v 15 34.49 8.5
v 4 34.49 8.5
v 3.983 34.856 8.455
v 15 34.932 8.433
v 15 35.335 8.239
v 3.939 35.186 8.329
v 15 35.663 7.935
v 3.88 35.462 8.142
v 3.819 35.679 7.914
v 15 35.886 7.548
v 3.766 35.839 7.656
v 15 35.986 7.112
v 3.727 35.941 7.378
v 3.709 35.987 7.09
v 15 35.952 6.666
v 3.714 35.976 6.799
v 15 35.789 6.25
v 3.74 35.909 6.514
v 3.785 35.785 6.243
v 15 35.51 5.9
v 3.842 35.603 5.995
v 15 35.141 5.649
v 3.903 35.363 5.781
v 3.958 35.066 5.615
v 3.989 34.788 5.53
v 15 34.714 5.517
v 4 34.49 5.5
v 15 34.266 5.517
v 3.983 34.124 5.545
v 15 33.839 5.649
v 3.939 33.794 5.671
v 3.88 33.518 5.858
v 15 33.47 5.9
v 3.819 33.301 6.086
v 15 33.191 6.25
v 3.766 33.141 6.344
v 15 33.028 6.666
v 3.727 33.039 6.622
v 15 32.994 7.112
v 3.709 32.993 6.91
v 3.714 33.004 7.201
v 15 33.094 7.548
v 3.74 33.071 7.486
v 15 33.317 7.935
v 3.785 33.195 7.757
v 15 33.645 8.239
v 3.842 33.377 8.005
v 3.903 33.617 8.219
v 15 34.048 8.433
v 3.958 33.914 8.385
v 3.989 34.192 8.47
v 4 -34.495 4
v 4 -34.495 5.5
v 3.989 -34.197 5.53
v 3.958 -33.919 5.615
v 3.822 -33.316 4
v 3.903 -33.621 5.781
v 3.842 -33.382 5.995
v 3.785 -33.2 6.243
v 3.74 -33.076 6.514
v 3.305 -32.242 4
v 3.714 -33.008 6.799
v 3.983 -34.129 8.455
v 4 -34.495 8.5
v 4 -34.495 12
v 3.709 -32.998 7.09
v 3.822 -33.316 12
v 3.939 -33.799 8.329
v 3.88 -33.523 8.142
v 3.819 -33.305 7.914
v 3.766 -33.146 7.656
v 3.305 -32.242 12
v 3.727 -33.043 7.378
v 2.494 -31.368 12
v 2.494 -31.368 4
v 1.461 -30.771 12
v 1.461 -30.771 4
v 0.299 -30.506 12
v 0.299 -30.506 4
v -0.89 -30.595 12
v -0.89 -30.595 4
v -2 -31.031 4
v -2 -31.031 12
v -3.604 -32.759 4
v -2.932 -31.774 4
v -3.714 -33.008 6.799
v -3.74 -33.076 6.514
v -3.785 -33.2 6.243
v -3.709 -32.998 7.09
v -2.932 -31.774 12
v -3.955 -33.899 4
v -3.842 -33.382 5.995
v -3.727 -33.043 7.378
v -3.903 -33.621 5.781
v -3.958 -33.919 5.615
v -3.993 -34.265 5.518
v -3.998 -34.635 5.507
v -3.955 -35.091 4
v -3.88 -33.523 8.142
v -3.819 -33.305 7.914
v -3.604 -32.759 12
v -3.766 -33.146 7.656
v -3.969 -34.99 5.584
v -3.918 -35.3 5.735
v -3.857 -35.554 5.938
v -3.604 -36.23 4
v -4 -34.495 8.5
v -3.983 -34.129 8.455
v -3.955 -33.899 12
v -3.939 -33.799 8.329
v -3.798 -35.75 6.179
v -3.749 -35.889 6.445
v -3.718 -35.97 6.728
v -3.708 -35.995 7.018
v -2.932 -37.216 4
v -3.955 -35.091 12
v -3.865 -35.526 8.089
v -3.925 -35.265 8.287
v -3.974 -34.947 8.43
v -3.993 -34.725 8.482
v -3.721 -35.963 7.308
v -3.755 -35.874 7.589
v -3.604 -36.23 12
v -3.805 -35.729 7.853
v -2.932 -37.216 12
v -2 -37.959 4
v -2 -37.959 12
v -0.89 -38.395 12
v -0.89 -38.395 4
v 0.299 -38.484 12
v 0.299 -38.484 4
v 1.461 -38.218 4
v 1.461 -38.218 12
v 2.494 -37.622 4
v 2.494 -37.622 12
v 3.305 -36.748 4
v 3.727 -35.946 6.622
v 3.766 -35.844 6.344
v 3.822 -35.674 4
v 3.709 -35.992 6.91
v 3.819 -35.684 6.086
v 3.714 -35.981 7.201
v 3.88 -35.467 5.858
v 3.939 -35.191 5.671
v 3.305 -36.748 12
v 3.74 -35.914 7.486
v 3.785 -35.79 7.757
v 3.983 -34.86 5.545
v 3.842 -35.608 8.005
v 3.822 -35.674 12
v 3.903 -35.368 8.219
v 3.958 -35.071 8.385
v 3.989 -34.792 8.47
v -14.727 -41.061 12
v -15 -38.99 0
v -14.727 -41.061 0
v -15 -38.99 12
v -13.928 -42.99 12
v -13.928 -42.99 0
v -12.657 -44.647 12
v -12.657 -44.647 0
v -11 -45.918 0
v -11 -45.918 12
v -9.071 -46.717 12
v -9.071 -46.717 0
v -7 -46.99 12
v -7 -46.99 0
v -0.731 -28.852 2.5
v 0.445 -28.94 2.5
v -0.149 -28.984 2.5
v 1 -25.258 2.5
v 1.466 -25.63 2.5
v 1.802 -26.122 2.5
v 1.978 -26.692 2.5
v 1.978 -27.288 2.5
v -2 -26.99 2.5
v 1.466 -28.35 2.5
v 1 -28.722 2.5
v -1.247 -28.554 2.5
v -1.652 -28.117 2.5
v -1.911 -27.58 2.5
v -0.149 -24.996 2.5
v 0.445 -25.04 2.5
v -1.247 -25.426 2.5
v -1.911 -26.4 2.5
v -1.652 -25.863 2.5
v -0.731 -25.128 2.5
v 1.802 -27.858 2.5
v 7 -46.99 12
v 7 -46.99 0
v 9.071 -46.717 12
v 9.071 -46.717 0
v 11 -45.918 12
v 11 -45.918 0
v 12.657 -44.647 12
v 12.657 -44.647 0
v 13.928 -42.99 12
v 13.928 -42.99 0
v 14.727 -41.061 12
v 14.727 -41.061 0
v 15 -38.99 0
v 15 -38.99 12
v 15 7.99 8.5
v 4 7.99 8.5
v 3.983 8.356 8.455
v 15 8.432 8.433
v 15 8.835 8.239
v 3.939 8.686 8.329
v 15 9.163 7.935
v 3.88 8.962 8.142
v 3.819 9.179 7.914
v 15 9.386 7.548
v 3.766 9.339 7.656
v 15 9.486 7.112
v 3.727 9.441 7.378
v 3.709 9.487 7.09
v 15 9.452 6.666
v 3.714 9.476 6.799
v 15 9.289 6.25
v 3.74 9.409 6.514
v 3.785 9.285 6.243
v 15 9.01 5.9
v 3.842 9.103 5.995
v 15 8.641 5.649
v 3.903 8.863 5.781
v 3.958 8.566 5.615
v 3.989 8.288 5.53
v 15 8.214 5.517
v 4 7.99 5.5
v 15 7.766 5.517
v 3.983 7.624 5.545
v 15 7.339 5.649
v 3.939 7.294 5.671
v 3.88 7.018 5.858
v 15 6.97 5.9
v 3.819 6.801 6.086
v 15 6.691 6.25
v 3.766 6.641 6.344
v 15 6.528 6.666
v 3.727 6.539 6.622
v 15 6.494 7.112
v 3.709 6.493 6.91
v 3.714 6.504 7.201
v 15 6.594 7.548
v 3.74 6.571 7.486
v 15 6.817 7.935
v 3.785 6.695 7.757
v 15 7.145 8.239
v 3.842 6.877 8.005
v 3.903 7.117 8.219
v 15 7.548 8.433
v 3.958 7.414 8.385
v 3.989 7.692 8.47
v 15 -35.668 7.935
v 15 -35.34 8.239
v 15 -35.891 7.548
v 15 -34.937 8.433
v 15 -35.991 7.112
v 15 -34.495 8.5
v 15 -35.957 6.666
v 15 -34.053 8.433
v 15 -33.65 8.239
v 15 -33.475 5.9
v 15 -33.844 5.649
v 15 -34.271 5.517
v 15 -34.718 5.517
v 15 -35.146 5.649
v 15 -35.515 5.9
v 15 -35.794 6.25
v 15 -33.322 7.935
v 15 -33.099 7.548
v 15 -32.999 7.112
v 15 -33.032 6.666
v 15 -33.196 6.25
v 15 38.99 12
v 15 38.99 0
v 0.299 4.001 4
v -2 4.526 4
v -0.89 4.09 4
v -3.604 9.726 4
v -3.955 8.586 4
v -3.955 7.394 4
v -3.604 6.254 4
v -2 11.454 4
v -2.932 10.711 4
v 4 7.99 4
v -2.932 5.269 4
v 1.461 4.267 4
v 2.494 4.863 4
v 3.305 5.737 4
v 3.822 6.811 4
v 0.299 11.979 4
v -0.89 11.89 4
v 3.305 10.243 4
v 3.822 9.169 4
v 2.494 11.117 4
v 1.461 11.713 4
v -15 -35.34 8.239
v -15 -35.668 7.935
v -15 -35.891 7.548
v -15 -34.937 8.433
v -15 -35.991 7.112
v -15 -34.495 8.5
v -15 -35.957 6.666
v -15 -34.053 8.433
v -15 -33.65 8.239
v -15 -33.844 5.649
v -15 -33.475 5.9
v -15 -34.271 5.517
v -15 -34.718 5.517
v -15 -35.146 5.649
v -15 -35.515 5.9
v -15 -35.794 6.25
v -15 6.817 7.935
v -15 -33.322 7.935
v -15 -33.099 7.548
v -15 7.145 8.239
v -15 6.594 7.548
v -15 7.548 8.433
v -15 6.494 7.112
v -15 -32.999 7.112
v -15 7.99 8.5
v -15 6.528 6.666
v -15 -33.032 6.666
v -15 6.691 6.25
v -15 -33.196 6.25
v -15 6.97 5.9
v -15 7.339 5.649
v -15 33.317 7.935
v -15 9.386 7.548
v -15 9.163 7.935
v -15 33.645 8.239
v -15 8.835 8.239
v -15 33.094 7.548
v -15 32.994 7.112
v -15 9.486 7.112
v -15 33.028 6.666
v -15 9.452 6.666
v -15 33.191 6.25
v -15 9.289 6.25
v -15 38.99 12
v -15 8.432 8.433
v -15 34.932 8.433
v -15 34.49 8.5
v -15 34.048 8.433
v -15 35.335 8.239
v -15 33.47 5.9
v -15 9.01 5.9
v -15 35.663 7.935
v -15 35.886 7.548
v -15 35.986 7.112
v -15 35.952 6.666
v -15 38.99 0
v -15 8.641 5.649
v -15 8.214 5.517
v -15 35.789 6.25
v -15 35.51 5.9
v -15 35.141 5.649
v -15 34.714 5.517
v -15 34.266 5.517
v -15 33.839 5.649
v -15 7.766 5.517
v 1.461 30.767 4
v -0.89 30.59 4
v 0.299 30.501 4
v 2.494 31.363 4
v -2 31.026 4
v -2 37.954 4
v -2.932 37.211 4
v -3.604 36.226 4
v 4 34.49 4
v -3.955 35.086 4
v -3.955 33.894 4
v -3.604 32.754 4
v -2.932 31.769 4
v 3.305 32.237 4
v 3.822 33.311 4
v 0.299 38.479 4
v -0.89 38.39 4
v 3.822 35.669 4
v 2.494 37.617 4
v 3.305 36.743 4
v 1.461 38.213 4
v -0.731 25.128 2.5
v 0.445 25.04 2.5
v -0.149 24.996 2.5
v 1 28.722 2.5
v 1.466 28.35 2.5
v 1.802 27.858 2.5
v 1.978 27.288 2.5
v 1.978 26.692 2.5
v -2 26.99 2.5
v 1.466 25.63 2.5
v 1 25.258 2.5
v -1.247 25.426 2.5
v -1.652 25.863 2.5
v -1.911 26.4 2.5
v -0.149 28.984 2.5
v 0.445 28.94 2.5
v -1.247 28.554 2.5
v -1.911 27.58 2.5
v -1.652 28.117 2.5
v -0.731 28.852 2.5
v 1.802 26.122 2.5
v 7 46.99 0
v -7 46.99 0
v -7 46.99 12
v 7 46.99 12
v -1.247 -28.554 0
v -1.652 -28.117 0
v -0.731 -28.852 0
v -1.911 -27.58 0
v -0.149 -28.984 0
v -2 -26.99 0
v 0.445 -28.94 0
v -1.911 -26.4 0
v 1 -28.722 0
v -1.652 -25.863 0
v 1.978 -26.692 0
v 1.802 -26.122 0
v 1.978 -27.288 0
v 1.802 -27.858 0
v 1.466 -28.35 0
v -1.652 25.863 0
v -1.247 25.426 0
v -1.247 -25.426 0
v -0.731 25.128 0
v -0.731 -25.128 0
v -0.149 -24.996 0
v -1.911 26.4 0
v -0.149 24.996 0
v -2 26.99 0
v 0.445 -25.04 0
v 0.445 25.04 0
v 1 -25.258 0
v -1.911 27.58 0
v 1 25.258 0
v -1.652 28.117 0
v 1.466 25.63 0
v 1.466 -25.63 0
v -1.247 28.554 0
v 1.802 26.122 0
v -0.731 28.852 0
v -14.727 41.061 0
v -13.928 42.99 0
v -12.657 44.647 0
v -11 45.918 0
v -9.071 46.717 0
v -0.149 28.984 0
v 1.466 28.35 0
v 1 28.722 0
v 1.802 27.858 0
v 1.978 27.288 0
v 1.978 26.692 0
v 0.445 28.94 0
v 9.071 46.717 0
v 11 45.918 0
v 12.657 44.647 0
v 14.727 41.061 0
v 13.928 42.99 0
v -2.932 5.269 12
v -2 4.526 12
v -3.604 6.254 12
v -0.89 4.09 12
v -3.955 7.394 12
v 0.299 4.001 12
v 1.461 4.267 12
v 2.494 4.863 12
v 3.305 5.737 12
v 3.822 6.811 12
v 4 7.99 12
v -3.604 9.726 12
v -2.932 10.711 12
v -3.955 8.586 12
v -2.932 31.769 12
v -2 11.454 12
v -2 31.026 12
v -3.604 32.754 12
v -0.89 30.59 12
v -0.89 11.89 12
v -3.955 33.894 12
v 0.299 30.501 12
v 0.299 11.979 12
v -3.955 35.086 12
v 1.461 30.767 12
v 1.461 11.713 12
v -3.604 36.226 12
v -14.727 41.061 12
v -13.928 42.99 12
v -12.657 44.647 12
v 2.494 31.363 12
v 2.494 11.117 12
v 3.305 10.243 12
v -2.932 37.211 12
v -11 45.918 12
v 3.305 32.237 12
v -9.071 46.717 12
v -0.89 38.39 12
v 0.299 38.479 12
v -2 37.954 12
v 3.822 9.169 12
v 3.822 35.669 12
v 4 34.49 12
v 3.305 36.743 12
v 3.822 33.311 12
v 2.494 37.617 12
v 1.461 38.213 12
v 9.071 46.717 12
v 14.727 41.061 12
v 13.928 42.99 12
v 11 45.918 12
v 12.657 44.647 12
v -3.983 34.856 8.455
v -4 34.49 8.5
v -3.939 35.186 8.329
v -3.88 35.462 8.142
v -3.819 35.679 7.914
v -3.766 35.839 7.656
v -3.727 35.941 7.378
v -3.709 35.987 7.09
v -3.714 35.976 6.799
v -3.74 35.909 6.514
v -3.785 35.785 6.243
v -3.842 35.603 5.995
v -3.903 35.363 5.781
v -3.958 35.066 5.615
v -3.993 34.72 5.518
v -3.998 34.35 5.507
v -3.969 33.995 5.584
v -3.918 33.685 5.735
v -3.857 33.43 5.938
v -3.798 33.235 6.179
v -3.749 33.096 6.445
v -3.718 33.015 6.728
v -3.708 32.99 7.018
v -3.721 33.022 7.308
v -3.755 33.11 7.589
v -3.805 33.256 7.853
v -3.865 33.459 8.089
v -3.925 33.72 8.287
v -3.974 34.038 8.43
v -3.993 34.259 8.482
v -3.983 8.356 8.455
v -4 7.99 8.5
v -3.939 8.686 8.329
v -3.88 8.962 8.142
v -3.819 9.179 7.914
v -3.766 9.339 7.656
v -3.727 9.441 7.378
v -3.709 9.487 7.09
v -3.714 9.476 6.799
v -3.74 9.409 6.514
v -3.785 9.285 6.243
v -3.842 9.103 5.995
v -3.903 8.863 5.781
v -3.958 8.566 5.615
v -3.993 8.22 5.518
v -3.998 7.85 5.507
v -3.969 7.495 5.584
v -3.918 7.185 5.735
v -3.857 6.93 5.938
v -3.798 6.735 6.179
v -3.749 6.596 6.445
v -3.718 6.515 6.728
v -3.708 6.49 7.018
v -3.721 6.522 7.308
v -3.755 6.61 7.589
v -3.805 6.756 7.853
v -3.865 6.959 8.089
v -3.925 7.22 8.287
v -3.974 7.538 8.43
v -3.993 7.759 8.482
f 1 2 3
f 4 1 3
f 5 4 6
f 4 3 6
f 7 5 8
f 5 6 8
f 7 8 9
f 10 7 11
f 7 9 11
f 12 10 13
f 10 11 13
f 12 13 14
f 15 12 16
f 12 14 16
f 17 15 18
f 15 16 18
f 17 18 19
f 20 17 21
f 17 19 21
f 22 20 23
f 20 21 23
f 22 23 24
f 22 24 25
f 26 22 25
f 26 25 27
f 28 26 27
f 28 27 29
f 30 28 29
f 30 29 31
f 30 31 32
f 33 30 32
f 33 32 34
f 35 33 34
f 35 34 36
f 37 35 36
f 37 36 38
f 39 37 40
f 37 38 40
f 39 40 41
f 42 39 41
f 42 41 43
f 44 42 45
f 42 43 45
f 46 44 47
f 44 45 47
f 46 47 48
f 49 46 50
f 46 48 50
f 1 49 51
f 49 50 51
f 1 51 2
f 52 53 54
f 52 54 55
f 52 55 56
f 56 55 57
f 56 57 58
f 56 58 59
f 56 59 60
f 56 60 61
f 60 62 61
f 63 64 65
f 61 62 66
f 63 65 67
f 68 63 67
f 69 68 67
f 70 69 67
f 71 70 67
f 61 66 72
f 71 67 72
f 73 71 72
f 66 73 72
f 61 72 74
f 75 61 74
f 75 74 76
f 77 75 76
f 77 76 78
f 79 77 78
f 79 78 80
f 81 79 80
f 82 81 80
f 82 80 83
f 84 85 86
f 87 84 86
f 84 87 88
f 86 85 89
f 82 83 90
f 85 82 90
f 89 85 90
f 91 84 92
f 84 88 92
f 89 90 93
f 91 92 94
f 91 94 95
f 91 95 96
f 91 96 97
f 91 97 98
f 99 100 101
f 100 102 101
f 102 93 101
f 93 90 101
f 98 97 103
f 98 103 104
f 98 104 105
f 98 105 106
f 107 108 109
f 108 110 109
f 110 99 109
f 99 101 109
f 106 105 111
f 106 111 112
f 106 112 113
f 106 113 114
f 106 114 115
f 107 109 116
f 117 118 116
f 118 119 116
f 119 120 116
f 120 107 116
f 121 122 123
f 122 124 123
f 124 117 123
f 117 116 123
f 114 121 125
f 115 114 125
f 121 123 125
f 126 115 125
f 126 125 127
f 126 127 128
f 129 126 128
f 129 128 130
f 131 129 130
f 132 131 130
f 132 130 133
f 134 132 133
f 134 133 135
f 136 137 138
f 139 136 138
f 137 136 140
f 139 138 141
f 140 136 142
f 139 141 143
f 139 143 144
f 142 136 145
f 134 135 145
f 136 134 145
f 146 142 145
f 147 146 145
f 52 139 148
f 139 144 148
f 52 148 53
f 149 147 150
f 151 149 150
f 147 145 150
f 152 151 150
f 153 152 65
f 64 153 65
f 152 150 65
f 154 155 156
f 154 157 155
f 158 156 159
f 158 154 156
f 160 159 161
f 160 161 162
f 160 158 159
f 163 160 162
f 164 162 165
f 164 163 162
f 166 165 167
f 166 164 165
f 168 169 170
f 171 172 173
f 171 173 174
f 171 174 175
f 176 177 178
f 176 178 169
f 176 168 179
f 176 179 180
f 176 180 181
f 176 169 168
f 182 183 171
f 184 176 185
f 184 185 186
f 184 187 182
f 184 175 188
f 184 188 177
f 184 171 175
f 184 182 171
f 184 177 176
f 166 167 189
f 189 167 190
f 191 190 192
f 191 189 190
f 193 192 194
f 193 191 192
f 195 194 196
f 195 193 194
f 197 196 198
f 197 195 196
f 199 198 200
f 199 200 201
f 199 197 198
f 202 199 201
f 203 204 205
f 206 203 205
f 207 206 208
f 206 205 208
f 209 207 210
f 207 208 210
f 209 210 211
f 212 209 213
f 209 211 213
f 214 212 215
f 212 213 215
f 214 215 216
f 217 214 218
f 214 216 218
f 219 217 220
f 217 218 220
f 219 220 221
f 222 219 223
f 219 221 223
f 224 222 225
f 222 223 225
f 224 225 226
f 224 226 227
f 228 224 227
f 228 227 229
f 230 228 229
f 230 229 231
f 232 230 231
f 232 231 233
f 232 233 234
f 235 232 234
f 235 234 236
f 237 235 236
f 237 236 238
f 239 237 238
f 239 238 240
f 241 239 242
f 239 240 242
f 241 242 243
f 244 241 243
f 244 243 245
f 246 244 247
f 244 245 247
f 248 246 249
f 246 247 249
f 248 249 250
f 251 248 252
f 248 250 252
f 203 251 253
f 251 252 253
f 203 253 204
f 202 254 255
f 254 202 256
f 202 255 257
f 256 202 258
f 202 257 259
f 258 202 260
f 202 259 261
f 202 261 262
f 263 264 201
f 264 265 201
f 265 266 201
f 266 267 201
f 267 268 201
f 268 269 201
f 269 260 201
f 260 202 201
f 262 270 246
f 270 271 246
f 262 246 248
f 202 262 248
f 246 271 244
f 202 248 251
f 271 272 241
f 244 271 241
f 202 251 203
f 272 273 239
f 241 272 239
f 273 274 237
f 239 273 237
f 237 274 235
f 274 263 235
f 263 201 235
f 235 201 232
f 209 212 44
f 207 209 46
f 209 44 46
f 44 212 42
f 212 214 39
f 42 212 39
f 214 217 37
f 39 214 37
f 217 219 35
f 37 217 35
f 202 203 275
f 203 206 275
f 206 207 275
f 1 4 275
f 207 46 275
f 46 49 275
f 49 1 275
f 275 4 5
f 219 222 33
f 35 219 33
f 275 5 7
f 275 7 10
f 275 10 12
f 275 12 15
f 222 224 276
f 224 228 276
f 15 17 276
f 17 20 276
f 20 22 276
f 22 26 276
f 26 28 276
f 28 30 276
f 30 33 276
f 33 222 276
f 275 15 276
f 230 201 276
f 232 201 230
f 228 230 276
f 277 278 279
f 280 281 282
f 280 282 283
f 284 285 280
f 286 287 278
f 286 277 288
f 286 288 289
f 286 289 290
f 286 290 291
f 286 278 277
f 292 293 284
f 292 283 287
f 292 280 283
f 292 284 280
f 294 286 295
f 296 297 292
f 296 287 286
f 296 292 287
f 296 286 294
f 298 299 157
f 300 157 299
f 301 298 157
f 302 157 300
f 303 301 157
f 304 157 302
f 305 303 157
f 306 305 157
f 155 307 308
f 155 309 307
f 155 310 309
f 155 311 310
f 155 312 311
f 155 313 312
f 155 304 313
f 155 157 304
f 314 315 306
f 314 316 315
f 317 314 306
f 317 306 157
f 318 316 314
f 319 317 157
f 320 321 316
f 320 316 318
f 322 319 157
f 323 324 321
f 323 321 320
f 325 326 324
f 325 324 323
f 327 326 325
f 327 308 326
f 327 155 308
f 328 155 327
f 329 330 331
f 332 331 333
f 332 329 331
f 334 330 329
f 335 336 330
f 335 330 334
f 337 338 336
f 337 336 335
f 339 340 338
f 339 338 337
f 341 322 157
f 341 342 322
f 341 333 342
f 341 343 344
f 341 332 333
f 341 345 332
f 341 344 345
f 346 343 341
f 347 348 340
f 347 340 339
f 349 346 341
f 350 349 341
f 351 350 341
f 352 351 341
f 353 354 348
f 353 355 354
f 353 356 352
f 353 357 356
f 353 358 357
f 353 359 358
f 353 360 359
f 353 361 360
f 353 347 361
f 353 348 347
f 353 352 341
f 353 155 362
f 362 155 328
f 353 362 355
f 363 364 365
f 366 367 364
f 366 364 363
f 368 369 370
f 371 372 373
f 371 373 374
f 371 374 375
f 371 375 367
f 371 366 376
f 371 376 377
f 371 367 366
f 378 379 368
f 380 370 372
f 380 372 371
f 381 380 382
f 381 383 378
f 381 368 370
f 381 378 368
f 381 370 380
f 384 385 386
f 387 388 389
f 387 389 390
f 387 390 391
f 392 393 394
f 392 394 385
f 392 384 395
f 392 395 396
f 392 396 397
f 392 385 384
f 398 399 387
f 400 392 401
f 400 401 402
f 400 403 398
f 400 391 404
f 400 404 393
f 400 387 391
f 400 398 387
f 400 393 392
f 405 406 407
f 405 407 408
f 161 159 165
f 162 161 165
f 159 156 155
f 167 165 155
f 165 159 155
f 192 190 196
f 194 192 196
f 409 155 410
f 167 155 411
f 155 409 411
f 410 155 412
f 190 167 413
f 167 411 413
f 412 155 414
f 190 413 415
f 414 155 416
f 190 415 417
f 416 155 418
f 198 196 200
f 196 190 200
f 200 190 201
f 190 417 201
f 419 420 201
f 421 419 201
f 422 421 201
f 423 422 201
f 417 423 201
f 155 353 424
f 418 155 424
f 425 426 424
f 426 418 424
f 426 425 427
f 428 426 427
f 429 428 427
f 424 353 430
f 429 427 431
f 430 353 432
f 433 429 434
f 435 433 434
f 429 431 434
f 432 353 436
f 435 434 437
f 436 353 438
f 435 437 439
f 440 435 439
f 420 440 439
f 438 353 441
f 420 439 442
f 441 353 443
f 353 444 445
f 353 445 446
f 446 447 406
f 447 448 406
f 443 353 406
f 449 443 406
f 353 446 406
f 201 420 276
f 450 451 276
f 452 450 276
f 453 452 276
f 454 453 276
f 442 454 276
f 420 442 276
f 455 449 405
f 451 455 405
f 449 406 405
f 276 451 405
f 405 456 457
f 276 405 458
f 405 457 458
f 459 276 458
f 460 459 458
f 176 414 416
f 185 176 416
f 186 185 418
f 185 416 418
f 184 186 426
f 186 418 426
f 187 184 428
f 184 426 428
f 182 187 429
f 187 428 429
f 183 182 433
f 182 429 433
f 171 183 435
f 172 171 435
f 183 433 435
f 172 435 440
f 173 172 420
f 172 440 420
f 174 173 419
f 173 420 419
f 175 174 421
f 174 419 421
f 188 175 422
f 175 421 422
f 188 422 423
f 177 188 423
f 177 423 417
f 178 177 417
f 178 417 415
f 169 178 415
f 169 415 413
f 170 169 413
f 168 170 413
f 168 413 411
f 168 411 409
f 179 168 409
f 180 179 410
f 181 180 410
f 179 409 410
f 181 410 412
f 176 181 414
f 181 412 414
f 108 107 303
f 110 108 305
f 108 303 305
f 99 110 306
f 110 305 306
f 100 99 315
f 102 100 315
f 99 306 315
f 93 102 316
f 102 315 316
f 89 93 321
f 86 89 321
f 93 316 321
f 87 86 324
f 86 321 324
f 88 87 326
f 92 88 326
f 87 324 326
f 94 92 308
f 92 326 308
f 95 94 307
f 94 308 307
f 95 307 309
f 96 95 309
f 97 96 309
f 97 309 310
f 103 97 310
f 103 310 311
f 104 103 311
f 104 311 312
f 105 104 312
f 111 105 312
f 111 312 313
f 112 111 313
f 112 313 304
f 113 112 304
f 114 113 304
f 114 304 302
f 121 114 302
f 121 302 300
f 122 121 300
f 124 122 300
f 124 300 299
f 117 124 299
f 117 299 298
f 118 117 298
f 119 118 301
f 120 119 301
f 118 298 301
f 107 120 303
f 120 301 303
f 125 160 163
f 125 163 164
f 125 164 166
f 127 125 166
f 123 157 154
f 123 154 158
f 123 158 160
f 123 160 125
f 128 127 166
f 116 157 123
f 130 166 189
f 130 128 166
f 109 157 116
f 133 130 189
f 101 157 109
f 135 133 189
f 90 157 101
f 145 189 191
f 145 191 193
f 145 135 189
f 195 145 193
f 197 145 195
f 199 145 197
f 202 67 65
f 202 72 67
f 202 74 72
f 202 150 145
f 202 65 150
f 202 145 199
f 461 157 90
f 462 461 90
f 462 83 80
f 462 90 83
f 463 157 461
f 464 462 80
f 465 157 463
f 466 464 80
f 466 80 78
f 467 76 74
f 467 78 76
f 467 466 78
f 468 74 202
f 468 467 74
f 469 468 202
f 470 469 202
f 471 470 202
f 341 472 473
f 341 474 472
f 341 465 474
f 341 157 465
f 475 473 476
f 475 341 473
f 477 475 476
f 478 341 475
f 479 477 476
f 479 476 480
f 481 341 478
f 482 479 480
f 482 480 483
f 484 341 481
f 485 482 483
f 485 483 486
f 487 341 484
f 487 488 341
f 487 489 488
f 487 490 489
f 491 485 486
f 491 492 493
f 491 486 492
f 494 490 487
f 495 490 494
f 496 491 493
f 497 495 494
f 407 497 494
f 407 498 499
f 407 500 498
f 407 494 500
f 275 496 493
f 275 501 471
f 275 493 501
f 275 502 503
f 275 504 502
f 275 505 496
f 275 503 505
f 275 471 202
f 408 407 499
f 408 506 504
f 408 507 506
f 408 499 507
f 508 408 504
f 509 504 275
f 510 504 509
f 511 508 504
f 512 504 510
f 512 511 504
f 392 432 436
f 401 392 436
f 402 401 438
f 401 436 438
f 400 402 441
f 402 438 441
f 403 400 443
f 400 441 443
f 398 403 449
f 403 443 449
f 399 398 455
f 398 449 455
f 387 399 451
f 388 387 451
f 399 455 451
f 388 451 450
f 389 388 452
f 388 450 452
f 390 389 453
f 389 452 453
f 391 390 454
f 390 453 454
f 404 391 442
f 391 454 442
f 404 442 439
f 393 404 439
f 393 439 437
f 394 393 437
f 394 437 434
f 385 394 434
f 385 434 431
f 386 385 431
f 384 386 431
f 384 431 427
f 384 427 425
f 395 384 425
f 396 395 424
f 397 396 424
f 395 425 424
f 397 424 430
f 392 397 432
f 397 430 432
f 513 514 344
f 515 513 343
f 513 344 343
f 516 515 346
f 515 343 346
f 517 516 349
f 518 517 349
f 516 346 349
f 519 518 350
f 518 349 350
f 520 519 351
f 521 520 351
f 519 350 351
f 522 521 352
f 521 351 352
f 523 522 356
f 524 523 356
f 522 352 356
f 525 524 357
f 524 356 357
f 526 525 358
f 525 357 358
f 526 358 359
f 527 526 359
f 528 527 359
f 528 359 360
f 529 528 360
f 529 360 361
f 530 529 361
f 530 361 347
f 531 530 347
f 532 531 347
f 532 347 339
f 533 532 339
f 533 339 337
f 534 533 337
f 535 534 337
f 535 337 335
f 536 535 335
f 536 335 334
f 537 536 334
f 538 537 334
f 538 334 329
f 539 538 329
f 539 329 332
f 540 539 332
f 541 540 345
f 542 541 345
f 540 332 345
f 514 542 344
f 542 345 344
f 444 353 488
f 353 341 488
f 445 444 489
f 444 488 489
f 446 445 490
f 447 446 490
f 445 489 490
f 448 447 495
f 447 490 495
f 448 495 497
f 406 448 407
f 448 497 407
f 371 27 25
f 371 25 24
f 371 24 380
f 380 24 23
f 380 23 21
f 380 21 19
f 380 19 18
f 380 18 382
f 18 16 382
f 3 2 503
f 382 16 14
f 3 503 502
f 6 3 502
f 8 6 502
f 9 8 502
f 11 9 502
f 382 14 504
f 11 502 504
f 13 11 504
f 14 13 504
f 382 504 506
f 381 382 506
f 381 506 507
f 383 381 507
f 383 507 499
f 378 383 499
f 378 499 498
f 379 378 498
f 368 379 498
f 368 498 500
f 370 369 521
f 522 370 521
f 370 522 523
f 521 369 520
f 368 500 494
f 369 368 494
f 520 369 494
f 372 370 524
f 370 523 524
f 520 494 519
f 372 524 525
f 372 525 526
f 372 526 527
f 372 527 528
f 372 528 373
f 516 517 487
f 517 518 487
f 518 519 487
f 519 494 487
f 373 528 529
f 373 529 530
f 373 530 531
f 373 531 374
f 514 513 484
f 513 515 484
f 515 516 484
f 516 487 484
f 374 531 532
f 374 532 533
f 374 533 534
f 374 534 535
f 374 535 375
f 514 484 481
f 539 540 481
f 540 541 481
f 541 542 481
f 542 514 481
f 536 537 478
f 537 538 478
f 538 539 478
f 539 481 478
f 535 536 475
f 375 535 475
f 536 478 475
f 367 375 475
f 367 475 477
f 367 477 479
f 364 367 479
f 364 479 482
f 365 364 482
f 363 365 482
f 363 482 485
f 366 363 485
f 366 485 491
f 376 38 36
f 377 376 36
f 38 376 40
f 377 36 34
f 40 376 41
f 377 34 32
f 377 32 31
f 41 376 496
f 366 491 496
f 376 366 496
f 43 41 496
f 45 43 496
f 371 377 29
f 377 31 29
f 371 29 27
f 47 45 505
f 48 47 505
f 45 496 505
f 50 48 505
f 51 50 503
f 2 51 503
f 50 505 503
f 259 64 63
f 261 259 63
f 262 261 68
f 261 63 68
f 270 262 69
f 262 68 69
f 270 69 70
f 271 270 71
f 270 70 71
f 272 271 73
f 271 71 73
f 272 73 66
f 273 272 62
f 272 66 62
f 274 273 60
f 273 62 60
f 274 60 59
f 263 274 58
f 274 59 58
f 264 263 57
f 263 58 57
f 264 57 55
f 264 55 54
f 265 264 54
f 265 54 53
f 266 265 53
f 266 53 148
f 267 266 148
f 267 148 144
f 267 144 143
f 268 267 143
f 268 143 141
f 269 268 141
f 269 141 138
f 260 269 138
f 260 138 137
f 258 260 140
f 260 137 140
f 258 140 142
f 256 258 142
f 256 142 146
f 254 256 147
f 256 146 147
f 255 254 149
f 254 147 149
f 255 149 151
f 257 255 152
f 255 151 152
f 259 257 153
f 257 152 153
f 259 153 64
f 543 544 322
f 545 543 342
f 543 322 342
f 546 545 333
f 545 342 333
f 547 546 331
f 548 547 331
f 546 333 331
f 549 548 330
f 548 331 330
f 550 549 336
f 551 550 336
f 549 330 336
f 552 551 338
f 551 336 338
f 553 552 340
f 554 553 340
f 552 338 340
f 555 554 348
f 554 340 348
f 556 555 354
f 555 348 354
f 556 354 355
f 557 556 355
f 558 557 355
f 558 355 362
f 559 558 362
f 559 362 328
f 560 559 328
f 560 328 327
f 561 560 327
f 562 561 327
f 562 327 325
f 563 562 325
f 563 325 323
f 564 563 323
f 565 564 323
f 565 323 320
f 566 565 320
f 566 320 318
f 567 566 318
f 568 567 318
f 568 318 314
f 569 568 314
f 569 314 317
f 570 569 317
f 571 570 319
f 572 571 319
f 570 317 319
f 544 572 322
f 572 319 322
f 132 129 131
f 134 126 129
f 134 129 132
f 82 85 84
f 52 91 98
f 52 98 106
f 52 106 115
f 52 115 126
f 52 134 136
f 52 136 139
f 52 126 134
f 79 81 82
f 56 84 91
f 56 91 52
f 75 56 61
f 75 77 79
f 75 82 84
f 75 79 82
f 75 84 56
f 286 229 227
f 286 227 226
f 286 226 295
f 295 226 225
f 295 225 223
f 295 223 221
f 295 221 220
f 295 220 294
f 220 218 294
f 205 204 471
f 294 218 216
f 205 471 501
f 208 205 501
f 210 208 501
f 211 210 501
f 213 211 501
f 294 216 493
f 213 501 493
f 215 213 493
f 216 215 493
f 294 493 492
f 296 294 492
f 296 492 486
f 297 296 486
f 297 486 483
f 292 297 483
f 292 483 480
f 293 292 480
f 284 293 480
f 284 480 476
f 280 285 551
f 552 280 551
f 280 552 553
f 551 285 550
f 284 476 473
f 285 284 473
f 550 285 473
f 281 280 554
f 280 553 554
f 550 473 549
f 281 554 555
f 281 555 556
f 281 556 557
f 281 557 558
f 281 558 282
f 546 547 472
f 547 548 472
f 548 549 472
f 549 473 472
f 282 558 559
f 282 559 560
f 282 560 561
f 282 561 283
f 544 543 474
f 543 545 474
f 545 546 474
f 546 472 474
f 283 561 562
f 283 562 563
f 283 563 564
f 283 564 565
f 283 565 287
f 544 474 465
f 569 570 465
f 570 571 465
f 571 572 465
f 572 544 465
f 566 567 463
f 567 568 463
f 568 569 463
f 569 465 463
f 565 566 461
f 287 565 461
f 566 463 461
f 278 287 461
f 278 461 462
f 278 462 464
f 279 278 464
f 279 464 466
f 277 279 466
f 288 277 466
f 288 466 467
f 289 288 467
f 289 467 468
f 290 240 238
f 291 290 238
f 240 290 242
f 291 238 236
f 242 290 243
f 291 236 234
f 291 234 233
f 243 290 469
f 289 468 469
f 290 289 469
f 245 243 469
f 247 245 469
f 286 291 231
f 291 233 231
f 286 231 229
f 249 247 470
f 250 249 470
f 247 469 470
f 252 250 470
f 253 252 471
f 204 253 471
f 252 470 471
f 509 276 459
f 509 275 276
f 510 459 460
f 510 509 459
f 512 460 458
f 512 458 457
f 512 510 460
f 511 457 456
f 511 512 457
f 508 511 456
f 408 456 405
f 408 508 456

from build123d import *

# Parameters (mm, degrees)
SKETCH1_W           = 30
SKETCH1_H           = 93.98
BOSS_EXTRUDE1_DEPTH = 12
FILLET1_R           = 8
SKETCH2_R           = 4
CUT_EXTRUDE1_DEPTH  = 8
SKETCH3_R           = 1.5
CUT_EXTRUDE2_DEPTH  = 31
SKETCH4_R           = 2
CUT_EXTRUDE3_DEPTH  = 2.5


with BuildPart() as part:
    # Sketch1 → Boss-Extrude1 (new body)
    with BuildSketch(Plane.XY):
        Rectangle(SKETCH1_W, SKETCH1_H)
    extrude(amount=BOSS_EXTRUDE1_DEPTH)

    # Fillet1
    fillet1_edges = [part.edges().sort_by_distance(p)[0] for p in [
        (15, -46.99, 6),
        (-15, -46.99, 6),
        (-15, 46.99, 6),
        (15, 46.99, 6),
    ]]
    fillet(fillet1_edges, radius=FILLET1_R)

    # Sketch2 → Cut-Extrude1 (cut)
    with BuildSketch(Plane.XY.offset(12)):
        with Locations((0, 7.99)):
            Circle(SKETCH2_R)
        with Locations((0, 34.49)):
            Circle(SKETCH2_R)
        with Locations((0, -34.494880812)):
            Circle(SKETCH2_R)
    extrude(amount=-CUT_EXTRUDE1_DEPTH, mode=Mode.SUBTRACT)

    # Sketch3 → Cut-Extrude2 (cut, through all)
    with BuildSketch(Plane.ZY.offset(15)):
        with Locations((7, 34.49)):
            Circle(SKETCH3_R)
        with Locations((7, 7.99)):
            Circle(SKETCH3_R)
        with Locations((7, -34.494880812)):
            Circle(SKETCH3_R)
    extrude(amount=-CUT_EXTRUDE2_DEPTH, mode=Mode.SUBTRACT)

    # Sketch4 → Cut-Extrude3 (cut)
    with BuildSketch(Plane(origin=(0, 0, 0), x_dir=(-1, 0, 0), z_dir=(0, 0, -1))):
        with Locations((0, -26.99)):
            Circle(SKETCH4_R)
        with Locations((0, 26.99)):
            Circle(SKETCH4_R)
    extrude(amount=-CUT_EXTRUDE3_DEPTH, mode=Mode.SUBTRACT)


solid = part.part
